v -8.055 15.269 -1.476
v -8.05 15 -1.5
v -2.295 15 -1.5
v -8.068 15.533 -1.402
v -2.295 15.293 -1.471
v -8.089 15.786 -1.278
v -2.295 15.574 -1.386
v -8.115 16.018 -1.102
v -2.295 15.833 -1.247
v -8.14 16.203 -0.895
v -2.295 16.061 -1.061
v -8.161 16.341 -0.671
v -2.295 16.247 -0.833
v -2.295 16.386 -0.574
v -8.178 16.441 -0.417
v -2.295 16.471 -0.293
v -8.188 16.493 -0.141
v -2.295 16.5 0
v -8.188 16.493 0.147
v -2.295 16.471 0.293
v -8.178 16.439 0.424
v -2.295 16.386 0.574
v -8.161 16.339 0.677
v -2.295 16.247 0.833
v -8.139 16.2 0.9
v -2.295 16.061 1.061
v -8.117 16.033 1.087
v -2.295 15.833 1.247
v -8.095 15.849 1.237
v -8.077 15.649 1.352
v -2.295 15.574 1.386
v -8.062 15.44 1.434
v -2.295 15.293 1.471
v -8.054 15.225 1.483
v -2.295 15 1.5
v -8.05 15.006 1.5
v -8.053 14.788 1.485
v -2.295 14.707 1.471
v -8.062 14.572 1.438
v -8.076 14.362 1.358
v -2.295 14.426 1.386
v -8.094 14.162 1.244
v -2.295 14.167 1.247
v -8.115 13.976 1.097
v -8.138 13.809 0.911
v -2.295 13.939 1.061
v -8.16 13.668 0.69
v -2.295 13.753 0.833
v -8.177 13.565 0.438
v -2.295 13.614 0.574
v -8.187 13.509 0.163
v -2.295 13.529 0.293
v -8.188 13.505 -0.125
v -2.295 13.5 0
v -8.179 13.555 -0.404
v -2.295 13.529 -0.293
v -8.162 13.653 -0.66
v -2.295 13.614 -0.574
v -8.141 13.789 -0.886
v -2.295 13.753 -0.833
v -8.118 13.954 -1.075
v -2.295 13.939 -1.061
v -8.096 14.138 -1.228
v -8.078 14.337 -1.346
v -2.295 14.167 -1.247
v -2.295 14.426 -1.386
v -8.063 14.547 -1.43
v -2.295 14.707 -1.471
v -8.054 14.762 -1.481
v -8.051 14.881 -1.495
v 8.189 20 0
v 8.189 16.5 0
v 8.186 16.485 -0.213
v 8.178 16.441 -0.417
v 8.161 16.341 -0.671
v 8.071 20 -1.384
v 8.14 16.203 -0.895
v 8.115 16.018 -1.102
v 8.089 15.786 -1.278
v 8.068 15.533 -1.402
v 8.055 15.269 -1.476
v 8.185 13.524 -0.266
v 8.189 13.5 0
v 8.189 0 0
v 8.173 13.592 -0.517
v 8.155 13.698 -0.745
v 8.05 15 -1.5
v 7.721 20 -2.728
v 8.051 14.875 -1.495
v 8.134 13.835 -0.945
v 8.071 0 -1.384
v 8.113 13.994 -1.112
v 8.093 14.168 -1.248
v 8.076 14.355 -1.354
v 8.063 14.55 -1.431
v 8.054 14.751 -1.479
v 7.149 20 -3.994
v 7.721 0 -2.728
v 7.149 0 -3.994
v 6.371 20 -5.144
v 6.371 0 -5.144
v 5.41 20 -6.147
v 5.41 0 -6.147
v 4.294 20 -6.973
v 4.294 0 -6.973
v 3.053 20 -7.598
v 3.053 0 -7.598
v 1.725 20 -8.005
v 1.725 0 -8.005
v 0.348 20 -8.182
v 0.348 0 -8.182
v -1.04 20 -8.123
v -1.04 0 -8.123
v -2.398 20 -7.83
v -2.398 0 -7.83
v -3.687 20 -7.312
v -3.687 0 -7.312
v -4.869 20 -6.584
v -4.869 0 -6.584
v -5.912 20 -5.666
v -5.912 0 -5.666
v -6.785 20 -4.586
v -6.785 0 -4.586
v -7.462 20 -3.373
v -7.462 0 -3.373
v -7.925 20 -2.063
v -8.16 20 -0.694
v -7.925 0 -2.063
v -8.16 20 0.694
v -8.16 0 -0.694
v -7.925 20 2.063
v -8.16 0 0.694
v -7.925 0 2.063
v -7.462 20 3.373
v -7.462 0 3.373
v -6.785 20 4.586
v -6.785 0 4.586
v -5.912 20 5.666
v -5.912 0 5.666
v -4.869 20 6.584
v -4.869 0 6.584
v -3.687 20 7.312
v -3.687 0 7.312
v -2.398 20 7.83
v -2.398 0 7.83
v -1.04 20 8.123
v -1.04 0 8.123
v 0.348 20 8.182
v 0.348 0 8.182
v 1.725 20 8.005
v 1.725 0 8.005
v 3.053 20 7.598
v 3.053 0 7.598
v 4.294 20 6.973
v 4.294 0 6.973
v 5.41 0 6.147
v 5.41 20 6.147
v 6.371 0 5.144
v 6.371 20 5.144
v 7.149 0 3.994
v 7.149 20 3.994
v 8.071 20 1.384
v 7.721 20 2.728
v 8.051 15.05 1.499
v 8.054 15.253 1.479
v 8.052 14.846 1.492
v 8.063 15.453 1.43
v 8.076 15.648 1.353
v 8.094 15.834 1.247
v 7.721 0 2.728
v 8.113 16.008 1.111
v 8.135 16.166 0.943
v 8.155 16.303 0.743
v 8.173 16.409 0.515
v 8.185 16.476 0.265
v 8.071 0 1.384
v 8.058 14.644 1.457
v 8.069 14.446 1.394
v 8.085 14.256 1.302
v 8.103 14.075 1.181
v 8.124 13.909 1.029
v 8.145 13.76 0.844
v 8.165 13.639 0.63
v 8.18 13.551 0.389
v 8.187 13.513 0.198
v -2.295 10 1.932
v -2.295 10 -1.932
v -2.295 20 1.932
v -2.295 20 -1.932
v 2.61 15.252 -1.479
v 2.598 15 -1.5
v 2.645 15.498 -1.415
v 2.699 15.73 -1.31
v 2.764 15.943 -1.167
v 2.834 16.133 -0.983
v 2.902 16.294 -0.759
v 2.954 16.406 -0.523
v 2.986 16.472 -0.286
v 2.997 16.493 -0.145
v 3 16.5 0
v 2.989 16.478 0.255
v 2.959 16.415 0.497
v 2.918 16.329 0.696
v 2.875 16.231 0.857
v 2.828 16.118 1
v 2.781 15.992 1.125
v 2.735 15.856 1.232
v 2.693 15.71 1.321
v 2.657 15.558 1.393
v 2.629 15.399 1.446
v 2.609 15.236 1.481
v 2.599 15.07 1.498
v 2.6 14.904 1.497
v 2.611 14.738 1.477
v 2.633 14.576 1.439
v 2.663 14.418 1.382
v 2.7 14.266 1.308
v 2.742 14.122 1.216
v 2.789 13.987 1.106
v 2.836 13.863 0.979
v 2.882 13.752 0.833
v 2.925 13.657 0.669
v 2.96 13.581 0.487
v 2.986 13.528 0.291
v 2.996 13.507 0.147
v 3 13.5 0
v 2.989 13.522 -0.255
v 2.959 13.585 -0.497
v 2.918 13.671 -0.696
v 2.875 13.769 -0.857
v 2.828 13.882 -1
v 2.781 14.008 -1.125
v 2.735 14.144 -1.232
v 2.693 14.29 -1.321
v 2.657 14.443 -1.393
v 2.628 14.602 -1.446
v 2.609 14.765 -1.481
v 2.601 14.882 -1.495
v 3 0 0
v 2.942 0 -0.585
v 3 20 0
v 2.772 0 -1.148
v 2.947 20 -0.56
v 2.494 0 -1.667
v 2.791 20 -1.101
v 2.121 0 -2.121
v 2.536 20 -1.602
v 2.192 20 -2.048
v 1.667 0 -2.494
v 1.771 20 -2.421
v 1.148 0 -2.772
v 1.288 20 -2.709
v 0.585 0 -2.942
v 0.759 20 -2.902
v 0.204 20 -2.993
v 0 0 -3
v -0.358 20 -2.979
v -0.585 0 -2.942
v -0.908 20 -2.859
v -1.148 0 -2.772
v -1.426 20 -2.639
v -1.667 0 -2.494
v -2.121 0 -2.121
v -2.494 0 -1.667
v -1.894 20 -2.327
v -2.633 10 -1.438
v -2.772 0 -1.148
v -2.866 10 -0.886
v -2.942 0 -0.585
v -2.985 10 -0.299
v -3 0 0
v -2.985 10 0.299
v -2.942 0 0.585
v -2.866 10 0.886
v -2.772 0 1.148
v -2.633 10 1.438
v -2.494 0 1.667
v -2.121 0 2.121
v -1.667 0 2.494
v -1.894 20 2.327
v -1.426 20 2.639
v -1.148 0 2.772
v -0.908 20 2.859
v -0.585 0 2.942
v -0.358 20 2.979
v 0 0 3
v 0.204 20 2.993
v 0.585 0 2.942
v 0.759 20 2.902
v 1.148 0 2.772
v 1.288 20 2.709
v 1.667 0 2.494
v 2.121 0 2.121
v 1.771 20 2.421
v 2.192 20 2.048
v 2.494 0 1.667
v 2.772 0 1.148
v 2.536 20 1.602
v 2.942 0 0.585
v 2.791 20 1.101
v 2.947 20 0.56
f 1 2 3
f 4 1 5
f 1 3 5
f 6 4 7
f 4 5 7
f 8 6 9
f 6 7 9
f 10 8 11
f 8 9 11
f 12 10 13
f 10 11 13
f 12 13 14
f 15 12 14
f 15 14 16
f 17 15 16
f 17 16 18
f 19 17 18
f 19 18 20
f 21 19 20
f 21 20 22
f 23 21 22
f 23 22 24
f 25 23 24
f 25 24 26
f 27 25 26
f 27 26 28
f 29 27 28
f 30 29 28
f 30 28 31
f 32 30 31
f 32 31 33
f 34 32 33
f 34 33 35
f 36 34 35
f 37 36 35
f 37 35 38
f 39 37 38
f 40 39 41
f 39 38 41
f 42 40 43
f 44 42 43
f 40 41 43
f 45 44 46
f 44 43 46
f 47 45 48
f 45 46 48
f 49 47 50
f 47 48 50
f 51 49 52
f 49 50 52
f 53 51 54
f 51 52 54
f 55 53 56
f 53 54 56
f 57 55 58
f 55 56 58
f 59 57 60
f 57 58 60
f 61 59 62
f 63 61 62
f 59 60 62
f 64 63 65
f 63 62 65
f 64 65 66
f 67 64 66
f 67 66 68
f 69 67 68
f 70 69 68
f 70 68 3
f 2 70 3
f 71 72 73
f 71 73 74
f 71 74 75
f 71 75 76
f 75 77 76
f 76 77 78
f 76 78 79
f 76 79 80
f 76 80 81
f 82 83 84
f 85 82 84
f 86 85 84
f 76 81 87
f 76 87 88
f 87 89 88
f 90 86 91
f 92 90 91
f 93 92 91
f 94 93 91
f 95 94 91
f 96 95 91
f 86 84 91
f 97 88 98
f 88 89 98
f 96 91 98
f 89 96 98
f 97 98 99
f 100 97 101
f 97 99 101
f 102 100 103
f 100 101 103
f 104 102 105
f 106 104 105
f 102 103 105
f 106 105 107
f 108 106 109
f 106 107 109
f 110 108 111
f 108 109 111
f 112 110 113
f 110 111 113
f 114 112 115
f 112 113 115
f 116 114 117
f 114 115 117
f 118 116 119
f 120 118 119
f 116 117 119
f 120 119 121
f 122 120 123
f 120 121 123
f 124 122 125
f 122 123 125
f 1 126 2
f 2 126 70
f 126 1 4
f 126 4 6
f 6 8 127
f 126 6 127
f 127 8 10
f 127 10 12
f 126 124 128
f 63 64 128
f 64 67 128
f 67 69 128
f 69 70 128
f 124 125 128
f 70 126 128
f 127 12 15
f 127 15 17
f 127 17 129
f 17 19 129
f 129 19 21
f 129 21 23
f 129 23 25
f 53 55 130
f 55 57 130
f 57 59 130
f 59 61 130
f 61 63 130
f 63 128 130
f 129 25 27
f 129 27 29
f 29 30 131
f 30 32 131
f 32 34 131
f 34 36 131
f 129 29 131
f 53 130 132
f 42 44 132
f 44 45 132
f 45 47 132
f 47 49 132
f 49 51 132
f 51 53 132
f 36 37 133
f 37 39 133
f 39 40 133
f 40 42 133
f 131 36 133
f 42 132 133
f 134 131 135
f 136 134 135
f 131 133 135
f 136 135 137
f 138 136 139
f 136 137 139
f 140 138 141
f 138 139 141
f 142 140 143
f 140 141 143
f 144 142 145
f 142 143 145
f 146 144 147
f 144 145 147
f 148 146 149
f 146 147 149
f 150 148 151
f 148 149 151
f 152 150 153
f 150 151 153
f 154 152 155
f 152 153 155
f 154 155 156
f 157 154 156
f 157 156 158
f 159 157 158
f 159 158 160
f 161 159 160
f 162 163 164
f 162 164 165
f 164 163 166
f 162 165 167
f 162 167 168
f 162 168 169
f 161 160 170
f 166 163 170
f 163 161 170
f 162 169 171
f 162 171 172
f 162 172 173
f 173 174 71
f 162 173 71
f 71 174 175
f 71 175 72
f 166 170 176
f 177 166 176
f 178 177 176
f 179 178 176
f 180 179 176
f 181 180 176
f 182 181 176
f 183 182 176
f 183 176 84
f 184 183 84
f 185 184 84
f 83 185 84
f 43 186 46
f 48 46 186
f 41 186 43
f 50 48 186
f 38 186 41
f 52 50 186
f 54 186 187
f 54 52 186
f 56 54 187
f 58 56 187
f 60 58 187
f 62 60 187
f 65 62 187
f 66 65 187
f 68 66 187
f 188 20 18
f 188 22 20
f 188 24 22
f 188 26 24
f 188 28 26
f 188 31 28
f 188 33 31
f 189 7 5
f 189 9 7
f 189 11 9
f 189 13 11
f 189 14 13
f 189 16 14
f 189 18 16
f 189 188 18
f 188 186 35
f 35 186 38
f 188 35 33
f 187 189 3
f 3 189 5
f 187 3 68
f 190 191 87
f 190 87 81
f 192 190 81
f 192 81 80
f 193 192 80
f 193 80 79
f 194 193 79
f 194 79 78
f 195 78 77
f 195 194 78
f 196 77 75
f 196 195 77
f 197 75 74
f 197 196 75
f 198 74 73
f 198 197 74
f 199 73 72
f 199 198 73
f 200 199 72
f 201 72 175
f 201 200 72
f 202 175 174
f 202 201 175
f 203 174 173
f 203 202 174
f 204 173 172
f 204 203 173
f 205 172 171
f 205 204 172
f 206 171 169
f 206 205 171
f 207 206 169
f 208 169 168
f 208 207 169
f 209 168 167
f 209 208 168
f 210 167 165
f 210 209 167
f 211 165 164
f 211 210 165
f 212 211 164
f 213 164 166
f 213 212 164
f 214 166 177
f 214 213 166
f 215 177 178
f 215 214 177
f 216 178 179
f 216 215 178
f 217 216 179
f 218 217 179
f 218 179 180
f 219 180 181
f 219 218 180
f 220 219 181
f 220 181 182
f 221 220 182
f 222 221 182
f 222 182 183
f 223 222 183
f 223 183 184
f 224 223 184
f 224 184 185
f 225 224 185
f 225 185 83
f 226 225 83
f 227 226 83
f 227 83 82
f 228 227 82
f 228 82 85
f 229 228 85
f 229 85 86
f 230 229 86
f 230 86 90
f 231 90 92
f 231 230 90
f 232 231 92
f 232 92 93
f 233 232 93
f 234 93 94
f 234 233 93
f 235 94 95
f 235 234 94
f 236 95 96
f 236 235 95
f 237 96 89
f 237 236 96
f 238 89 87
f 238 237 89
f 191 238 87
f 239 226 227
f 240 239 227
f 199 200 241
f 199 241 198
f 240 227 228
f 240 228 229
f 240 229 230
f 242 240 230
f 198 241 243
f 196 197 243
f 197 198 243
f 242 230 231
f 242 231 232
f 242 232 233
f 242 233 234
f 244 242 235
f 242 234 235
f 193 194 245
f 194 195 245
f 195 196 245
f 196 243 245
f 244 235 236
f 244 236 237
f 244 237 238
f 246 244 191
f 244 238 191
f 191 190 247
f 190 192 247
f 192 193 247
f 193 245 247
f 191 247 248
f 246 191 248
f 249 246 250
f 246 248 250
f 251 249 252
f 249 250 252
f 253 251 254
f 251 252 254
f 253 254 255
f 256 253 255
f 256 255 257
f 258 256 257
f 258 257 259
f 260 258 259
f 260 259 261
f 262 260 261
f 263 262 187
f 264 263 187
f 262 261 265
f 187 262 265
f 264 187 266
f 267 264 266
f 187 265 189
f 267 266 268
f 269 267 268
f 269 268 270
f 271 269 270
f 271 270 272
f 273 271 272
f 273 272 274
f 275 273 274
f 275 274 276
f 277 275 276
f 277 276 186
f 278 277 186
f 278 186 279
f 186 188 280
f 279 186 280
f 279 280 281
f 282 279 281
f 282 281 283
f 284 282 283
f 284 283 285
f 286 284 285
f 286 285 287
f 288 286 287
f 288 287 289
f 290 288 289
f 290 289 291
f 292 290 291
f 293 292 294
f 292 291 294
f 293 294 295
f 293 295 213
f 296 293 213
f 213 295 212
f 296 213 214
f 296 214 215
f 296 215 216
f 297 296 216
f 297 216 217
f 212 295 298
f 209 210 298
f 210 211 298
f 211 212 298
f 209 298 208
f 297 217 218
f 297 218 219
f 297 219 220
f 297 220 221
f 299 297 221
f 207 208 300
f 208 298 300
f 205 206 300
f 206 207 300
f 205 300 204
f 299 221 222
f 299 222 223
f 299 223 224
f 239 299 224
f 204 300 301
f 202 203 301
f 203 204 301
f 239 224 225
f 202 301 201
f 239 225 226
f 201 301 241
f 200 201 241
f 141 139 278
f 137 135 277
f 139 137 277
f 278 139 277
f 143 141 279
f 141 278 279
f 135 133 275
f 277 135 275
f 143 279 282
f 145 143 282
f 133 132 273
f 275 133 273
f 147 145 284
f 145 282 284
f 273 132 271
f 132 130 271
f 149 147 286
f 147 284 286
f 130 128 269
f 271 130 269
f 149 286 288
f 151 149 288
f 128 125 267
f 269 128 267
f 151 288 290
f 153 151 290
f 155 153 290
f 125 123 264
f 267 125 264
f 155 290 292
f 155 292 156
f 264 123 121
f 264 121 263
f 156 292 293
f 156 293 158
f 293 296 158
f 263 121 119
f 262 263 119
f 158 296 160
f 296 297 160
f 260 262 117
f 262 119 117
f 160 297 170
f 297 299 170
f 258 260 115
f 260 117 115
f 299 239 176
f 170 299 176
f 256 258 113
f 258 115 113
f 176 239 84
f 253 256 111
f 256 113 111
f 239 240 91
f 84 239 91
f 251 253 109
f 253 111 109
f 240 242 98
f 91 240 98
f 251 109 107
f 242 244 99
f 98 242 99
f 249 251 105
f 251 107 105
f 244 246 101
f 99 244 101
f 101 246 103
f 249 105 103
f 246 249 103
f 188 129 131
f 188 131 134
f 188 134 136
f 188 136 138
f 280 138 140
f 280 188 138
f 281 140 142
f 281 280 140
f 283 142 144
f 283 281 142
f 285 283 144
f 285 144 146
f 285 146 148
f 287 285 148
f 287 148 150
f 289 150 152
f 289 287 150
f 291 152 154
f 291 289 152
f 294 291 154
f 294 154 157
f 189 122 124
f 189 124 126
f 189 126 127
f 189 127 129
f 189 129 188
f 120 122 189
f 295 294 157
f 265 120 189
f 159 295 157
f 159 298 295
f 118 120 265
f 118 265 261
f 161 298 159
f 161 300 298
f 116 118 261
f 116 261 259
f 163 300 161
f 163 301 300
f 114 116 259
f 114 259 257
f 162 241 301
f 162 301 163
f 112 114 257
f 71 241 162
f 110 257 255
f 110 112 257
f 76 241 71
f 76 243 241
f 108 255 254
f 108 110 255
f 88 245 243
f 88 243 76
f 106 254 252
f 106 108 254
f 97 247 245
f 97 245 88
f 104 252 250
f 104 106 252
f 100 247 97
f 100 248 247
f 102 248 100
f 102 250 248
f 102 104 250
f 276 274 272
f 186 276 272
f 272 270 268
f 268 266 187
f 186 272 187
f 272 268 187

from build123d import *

# Parameters (mm, degrees)
SKETCH1_R               = 8.189006913
BOSS_EXTRUDE1_DEPTH     = 20
SKETCH2_R               = 3
CUT_EXTRUDE1_DEPTH      = 30
SKETCH4_W               = 1.839212521
SKETCH4_H               = 4.190652527
BOSS_EXTRUDE2_DEPTH     = 10
CUT_EXTRUDE2_DEPTH      = 10
CUT_EXTRUDE2_DEPTH_BACK = 10
SKETCH3_R               = 1.5


with BuildPart() as part:
    # Sketch1 → Boss-Extrude1 (new body)
    with BuildSketch(Plane(origin=(0, 0, 0), x_dir=(1, 0, 0), z_dir=(0, 1, 0))):
        Circle(SKETCH1_R)
    extrude(amount=BOSS_EXTRUDE1_DEPTH)

    # Sketch2 → Cut-Extrude1 (cut)
    with BuildSketch(Plane(origin=(0, 20, 0), x_dir=(1, 0, 0), z_dir=(0, 1, 0))):
        Circle(SKETCH2_R)
    extrude(amount=-CUT_EXTRUDE1_DEPTH, mode=Mode.SUBTRACT)

    # Sketch4 → Boss-Extrude2 (add)
    with BuildSketch(Plane(origin=(0, 20, 0), x_dir=(1, 0, 0), z_dir=(0, 1, 0))):
        with Locations((-3.214713917, 0.163363311)):
            Rectangle(SKETCH4_W, SKETCH4_H)
    extrude(amount=-BOSS_EXTRUDE2_DEPTH)

    # Sketch3 → Cut-Extrude2 (cut, two sides: drawn at the far end of the back side and taken through both)
    with BuildSketch(Plane(origin=(0, 0, 0), x_dir=(0, 0, -1), z_dir=(1, 0, 0)).offset(-CUT_EXTRUDE2_DEPTH_BACK)):
        with Locations((0, 15)):
            Circle(SKETCH3_R)
    extrude(amount=CUT_EXTRUDE2_DEPTH + CUT_EXTRUDE2_DEPTH_BACK, mode=Mode.SUBTRACT)


solid = part.part
